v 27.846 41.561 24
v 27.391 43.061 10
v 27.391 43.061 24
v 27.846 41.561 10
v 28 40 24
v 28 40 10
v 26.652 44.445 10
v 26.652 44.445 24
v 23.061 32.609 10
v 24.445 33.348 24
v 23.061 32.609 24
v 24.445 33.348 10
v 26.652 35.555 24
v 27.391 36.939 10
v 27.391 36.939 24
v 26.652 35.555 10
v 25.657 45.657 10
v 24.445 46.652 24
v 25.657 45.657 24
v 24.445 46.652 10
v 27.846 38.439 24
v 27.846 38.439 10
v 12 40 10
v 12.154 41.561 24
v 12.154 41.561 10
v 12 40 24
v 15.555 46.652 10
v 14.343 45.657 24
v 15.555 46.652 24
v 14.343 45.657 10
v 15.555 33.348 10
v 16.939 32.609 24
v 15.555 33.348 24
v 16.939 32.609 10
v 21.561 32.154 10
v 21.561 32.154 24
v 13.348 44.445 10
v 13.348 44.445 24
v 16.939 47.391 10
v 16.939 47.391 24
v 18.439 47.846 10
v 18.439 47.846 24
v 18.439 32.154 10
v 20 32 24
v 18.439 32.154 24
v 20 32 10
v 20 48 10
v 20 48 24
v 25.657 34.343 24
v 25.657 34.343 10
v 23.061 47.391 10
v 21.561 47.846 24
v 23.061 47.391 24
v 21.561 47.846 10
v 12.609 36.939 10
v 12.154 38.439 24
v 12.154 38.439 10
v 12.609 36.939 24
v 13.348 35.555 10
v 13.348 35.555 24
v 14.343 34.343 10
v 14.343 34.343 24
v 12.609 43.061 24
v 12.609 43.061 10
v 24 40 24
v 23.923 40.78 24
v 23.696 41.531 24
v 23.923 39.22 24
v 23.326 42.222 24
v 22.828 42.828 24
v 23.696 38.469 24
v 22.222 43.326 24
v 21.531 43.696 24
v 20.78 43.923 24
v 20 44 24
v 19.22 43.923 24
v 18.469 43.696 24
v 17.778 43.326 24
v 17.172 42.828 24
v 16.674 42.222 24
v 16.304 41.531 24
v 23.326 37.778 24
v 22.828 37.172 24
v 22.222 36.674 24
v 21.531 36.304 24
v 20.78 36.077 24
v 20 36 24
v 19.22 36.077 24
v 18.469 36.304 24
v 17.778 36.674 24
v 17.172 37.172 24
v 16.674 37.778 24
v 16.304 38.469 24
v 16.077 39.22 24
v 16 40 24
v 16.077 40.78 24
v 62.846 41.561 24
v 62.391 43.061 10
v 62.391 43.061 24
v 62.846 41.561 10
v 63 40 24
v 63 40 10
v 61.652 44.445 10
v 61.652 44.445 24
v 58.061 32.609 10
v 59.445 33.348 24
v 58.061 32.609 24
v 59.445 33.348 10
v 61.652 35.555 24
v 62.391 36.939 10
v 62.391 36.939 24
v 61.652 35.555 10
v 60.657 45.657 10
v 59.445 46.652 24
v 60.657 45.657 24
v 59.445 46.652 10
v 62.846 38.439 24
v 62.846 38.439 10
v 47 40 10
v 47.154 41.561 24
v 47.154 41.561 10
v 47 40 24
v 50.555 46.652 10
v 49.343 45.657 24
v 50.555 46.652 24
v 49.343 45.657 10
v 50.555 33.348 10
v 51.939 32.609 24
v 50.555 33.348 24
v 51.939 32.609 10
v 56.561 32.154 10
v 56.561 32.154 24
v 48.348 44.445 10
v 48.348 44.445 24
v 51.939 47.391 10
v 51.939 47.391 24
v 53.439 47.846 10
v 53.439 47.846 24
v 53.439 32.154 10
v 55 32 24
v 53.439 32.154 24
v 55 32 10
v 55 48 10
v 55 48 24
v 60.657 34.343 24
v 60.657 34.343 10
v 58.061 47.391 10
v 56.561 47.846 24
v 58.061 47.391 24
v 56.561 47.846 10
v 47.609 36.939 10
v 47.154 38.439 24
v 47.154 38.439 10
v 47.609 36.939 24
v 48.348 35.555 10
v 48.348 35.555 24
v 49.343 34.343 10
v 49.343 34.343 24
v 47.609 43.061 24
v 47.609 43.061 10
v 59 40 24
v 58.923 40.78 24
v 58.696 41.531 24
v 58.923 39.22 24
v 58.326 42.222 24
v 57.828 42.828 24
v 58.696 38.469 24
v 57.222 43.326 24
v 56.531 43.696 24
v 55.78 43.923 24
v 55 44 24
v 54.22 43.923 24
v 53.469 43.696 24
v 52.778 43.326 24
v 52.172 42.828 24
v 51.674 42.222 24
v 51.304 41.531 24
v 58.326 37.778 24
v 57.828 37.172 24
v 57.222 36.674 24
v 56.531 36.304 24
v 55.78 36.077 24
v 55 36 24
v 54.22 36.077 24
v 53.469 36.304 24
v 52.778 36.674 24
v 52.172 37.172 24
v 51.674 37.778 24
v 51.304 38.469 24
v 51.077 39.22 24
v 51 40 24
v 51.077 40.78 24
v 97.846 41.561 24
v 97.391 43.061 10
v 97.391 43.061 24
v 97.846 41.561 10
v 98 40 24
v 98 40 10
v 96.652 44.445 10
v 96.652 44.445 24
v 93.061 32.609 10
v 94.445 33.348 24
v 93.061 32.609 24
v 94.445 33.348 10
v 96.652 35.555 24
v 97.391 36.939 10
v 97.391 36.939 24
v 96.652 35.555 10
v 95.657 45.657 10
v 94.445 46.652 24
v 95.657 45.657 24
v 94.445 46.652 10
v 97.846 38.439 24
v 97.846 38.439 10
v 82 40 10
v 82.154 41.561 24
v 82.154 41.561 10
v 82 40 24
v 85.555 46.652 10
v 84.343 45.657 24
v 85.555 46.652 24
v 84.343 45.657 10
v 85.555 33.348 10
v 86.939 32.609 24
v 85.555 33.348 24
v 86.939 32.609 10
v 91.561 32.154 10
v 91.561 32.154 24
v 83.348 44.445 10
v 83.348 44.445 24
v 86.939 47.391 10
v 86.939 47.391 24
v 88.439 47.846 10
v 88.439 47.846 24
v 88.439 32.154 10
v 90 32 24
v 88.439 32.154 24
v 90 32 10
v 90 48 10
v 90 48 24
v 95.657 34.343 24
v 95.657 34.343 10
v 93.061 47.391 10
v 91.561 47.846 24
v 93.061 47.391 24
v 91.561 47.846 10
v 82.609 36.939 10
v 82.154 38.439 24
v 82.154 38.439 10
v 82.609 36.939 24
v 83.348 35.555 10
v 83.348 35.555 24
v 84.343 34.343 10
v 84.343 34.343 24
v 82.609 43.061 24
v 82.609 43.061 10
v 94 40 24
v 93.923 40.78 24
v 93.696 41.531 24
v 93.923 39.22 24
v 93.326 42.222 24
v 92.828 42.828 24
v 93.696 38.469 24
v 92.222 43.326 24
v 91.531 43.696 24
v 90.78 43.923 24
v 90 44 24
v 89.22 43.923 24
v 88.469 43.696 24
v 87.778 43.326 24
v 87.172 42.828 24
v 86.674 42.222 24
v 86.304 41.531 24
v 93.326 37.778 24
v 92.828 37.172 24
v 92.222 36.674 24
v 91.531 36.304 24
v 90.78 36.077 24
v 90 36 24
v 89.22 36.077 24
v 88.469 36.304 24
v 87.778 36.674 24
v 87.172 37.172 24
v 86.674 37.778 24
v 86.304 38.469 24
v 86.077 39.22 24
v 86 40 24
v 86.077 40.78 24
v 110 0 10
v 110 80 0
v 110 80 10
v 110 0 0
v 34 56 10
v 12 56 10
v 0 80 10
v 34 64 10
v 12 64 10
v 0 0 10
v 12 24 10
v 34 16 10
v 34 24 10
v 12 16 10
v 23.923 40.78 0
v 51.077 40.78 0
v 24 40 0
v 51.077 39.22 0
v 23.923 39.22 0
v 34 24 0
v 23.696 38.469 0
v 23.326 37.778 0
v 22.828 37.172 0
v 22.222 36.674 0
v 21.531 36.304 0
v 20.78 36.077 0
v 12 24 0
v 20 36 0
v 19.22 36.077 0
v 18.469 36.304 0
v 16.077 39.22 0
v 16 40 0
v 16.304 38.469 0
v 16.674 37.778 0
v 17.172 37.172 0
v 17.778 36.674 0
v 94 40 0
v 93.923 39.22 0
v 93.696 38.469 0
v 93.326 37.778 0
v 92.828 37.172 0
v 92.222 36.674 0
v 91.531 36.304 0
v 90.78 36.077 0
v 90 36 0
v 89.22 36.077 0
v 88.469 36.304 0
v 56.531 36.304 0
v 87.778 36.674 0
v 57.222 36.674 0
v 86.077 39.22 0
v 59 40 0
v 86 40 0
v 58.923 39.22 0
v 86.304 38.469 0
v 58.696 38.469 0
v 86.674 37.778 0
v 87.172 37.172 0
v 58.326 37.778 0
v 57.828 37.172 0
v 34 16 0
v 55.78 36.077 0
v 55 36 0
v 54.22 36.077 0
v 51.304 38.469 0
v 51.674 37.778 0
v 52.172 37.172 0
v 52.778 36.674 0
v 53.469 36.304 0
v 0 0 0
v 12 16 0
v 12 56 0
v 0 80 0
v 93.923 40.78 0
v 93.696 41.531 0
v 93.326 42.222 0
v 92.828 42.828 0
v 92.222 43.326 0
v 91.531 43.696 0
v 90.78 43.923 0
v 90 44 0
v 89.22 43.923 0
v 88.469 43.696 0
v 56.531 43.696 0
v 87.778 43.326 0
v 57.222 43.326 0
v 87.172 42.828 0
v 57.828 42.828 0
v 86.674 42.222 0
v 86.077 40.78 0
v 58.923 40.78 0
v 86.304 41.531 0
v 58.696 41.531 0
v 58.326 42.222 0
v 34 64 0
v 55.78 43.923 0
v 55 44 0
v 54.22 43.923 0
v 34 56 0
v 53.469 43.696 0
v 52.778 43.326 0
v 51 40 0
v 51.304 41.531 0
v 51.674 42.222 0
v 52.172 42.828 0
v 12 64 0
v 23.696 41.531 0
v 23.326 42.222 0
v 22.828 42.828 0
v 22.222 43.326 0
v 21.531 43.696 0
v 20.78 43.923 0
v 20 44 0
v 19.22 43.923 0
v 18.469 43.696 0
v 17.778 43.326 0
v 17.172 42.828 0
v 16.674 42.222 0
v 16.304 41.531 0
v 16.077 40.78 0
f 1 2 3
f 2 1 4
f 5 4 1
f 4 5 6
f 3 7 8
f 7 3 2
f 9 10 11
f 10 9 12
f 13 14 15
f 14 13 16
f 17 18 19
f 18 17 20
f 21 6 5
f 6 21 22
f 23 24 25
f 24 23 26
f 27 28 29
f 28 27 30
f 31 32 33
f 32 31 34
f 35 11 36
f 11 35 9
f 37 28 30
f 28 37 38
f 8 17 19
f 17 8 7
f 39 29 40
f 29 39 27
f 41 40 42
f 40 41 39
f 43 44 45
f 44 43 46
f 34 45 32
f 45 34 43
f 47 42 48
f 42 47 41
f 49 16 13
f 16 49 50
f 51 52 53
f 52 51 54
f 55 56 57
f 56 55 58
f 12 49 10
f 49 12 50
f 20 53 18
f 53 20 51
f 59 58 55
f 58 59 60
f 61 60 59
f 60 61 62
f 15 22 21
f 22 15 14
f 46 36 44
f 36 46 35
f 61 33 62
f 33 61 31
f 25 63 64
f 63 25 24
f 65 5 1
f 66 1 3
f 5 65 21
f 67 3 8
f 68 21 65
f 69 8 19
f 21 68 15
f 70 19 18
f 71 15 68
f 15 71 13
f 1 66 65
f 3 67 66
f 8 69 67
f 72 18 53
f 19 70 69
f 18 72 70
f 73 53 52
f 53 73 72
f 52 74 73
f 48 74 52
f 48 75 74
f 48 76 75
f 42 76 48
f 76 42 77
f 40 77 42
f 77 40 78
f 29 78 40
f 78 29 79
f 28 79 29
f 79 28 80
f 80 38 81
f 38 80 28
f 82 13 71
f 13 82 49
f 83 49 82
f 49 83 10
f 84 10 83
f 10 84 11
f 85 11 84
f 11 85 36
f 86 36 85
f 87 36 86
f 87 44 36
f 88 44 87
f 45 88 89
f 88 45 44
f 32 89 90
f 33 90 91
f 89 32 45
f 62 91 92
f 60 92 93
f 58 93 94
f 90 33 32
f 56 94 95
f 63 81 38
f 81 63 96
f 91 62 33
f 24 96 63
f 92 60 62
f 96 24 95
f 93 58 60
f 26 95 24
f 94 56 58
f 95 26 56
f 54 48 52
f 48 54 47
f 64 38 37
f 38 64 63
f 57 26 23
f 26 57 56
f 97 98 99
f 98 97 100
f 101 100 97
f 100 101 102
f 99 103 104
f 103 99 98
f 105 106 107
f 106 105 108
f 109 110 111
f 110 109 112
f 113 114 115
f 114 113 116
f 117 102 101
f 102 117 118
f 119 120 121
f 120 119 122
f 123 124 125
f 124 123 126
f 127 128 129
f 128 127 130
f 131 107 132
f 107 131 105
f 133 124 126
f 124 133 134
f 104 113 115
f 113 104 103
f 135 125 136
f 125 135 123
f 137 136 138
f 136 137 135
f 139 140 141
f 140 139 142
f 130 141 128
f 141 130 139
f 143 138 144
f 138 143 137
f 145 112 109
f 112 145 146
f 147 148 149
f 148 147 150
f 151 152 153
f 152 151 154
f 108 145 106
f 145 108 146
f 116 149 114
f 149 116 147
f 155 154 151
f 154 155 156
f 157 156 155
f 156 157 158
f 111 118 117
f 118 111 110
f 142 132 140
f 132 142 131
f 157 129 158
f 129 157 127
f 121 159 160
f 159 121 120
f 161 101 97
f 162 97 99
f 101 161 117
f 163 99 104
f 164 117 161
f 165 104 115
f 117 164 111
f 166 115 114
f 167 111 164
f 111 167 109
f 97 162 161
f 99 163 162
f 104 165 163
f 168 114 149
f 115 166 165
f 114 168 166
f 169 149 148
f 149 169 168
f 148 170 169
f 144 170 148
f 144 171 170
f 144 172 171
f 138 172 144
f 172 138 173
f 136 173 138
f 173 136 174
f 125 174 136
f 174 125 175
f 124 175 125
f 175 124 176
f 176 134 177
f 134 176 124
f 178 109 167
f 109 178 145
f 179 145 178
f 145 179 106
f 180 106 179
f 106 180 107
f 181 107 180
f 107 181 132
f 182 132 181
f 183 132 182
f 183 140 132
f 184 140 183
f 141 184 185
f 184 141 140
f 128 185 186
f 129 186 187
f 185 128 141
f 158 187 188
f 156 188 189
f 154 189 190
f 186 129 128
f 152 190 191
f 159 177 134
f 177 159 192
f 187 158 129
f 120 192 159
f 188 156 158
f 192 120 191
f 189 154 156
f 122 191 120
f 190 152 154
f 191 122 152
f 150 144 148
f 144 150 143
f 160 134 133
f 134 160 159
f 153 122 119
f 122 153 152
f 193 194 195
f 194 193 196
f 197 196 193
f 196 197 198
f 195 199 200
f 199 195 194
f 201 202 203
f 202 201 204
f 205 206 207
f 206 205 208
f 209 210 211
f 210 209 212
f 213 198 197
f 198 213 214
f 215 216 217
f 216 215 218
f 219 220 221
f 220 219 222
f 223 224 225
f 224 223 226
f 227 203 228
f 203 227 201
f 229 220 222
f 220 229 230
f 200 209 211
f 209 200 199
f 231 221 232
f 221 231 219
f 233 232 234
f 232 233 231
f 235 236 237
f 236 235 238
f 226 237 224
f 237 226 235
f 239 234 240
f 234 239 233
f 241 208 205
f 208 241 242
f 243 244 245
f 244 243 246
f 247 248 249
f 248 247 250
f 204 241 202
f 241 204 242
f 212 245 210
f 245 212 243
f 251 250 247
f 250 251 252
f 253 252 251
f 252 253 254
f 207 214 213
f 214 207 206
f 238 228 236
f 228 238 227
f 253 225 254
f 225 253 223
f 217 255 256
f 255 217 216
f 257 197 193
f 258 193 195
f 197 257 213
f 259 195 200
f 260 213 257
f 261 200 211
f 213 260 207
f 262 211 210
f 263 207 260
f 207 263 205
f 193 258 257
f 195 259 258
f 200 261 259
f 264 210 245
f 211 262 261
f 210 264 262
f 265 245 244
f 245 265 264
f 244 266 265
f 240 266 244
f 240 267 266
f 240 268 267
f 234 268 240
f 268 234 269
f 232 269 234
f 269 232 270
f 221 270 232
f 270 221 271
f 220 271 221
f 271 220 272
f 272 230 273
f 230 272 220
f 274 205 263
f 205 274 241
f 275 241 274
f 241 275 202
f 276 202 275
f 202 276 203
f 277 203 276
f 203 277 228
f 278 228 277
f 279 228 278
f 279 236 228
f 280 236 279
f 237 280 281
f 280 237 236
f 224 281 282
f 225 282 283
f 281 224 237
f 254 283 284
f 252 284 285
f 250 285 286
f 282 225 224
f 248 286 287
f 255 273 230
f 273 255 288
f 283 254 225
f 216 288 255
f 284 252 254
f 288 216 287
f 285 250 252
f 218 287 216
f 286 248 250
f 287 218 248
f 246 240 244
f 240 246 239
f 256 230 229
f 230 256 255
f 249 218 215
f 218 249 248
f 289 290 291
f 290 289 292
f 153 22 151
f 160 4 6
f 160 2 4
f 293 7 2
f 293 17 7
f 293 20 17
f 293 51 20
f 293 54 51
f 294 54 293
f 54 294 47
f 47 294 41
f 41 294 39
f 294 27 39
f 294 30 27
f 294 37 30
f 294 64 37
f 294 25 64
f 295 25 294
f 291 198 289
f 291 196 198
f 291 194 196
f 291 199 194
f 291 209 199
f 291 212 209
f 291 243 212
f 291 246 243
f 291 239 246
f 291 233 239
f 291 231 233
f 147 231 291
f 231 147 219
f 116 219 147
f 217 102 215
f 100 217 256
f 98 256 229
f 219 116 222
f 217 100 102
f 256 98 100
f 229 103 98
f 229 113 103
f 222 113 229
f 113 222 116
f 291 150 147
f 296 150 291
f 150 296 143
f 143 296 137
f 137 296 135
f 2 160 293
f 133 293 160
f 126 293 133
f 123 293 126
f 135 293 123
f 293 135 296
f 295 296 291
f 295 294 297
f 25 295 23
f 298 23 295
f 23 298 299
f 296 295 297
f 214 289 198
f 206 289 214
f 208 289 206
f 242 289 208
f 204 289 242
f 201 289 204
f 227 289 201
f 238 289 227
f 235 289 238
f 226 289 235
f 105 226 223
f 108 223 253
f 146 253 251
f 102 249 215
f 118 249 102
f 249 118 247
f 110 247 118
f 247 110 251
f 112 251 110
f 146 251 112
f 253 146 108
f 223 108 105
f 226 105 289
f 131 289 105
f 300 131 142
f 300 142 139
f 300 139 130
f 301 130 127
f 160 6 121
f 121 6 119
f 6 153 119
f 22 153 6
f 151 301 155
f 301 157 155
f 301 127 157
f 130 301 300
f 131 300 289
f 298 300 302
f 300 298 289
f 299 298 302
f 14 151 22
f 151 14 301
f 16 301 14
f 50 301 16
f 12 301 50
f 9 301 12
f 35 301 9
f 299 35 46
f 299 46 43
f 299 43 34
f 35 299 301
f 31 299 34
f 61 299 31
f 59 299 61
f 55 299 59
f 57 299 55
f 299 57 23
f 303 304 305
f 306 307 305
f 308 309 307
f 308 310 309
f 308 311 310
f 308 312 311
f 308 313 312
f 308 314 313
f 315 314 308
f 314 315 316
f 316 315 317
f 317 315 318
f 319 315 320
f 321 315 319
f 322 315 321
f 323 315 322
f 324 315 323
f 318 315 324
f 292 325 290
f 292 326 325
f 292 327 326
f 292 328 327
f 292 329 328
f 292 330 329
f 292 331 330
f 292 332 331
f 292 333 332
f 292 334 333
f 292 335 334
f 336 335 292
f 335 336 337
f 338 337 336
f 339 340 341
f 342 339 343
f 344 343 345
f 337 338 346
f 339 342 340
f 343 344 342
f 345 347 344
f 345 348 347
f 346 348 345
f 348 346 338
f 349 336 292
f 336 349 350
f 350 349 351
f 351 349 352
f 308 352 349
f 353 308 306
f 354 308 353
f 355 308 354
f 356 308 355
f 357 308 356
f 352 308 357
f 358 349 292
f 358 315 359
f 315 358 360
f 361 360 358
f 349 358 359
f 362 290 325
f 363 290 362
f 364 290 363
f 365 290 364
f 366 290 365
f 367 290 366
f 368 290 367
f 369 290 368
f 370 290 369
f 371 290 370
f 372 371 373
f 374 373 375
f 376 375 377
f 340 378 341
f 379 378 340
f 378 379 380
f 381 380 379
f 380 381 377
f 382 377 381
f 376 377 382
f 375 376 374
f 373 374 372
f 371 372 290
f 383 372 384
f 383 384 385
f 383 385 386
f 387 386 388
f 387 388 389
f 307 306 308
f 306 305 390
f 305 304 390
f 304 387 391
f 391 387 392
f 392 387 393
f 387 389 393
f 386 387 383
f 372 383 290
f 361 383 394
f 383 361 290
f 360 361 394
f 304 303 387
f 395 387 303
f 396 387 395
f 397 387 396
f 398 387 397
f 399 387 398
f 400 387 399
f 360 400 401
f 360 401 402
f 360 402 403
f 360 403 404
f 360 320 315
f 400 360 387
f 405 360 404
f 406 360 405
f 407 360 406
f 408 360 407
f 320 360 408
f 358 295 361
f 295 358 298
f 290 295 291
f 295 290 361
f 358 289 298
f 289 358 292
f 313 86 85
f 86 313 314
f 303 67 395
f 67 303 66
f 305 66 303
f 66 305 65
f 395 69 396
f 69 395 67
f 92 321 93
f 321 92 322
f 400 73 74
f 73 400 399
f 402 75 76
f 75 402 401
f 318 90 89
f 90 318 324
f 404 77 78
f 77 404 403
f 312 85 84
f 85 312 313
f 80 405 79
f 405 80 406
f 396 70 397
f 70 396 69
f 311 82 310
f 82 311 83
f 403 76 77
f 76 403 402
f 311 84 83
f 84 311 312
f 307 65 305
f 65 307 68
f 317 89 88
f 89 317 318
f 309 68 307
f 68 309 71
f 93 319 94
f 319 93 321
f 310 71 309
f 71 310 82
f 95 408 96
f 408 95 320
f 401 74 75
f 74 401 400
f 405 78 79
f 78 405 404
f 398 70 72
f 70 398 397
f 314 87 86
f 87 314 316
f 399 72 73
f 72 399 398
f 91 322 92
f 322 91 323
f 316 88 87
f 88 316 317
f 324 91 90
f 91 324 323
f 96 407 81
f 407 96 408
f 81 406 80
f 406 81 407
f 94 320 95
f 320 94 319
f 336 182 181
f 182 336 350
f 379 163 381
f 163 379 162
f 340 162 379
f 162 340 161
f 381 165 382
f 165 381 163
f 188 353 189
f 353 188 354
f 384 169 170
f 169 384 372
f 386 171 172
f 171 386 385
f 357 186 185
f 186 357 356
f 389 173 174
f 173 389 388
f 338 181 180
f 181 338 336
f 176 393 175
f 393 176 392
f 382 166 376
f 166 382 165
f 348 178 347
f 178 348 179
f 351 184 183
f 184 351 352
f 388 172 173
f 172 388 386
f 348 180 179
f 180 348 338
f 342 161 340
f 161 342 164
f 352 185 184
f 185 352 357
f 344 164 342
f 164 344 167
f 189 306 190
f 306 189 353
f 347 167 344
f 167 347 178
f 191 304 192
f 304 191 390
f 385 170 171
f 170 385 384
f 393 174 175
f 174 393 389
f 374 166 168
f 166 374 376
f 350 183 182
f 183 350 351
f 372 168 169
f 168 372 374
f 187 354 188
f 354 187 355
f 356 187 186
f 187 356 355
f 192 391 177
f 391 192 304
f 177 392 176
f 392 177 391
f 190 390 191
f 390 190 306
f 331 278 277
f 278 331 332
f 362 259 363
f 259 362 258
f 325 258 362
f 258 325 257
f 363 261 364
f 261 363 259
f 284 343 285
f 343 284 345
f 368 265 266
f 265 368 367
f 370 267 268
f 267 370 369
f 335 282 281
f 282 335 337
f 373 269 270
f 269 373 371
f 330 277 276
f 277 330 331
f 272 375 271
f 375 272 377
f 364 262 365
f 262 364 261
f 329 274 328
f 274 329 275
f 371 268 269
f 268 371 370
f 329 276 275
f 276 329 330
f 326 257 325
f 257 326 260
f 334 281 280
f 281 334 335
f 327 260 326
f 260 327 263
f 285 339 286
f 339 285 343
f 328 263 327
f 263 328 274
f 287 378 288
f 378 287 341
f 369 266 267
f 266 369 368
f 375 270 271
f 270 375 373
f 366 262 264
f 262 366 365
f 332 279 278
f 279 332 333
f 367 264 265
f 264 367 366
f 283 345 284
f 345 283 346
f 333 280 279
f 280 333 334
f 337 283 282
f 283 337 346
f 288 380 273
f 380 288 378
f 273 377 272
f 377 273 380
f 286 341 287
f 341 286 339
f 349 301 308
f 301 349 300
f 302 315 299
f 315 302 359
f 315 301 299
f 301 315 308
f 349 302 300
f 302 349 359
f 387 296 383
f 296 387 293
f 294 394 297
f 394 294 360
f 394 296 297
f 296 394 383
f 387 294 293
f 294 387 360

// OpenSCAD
$fn = 32;

// ----------------------------------------------------------------------
// Drill jig: three_boss_slot jig
// ----------------------------------------------------------------------

// --- parameters (mm) ---
plate_l = 110;            // plate length, X
plate_w = 80;             // plate width, Y
plate_t = 10;             // plate thickness
boss_d = 16;              // guide boss diameter
boss_h = 15;              // boss height above the plate
guide_d = 8;              // guide hole diameter
boss_pitch = 35;          // boss pitch
slot_w = 8;               // clamp slot width
slot_l = 22;              // clamp slot length
slot_x = 12;              // slot start X

n_boss = 3;  // guide bosses
boss_x0 = (plate_l - (n_boss - 1) * boss_pitch) / 2;  // first boss X
boss_top = plate_t - 1 + boss_h;  // boss crown height
total_h = boss_top;  // overall height

difference() {
  union() {
  cube([plate_l, plate_w, plate_t]);
  for (i = [0 : n_boss - 1])
    translate([boss_x0 + i * boss_pitch, plate_w / 2, plate_t - 1])
      cylinder(h = boss_h, d = boss_d);
  }
  for (i = [0 : n_boss - 1])
    translate([boss_x0 + i * boss_pitch, plate_w / 2, -1])
      cylinder(h = plate_t + boss_h, d = guide_d);
  for (cy = [plate_w * 0.25, plate_w * 0.75])
    translate([slot_x, cy - slot_w / 2, -1])
      cube([slot_l, slot_w, plate_t + 2]);
}
